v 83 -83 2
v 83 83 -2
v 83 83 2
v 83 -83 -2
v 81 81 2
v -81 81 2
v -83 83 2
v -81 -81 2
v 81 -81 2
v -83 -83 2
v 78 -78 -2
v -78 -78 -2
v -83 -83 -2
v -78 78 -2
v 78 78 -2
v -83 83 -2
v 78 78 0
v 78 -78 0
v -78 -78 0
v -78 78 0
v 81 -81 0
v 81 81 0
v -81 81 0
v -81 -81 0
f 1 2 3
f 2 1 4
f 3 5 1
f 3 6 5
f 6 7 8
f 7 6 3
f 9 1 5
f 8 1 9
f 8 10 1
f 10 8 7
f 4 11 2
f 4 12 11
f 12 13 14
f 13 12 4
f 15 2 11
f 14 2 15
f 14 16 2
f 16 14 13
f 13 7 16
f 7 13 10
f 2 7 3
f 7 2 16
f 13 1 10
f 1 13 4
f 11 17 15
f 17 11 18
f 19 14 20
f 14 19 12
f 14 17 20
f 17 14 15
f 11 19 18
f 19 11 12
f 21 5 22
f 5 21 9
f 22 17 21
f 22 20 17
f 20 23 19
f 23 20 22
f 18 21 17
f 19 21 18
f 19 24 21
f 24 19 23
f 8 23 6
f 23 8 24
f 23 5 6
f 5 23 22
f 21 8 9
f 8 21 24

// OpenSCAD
// specified parameters
panel_width = 162;
window_width = 156;
frame_thickness = 2;
edge_width = 2;

// calculated parameters
frame_width = panel_width + 2*edge_width;

difference() {
    cube([frame_width, frame_width, 2*frame_thickness], center=true);
    cube([window_width, window_width, 2.01*frame_thickness], center=true);
    translate([0, 0, frame_thickness])
        cube([panel_width, panel_width, 2*frame_thickness], center=true);
}
